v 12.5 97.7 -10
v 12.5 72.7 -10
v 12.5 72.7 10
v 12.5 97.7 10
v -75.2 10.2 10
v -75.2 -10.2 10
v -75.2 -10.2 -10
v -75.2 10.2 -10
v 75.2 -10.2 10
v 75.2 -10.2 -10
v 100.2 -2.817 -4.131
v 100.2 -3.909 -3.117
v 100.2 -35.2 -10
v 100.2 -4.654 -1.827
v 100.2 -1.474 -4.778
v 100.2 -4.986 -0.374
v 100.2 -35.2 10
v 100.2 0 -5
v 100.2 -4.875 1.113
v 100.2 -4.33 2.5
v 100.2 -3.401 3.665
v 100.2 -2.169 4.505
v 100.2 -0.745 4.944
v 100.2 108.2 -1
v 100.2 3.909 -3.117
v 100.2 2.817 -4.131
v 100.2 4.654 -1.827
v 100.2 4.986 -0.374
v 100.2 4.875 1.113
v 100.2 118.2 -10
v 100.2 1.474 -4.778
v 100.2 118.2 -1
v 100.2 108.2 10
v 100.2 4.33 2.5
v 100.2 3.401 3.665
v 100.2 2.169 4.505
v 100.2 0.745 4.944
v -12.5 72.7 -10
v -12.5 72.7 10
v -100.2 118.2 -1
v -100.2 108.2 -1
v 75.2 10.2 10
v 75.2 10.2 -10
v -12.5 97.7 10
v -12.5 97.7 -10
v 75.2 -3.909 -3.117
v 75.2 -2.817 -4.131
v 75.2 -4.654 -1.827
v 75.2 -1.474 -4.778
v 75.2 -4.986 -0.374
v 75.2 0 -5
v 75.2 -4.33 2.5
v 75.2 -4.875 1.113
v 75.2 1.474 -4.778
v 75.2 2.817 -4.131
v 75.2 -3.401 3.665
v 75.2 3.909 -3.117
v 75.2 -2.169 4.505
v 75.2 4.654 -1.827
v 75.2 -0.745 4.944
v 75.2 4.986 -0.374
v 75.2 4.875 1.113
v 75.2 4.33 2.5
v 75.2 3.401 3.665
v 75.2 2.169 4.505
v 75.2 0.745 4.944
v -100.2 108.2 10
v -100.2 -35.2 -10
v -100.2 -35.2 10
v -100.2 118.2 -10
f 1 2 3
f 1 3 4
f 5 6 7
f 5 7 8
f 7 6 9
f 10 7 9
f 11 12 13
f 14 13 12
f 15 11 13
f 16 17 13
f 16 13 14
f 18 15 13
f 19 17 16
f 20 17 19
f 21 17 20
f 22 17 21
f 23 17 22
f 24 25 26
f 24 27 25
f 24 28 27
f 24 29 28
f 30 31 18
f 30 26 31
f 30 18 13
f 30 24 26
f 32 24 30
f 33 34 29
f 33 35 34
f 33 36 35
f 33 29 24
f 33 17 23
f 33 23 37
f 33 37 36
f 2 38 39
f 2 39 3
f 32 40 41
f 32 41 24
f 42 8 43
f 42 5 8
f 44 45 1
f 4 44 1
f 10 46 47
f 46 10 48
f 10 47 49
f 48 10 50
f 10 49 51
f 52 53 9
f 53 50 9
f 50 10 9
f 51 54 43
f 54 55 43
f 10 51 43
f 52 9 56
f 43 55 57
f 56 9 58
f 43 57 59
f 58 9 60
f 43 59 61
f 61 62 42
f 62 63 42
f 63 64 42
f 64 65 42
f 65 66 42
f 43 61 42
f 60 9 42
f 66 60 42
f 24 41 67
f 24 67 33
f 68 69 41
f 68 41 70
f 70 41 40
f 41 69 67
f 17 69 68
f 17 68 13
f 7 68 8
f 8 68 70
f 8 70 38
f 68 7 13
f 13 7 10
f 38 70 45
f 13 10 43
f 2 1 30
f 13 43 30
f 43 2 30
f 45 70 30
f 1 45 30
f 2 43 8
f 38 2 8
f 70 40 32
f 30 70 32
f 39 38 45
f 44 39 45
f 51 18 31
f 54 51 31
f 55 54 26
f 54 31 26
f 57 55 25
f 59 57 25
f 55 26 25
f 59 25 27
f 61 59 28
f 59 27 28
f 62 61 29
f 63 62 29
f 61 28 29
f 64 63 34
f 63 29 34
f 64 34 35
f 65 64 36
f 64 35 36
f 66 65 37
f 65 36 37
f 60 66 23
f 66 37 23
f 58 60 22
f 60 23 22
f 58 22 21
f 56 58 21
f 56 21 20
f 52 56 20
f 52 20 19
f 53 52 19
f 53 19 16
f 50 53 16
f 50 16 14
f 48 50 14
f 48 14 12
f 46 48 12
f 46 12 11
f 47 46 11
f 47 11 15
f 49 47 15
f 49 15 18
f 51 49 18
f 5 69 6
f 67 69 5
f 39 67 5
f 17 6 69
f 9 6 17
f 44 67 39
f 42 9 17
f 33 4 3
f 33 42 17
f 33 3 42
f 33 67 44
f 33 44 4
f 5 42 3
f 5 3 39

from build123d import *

# Parameters (mm, degrees)
SKETCH2_W               = 200.4
SKETCH2_H               = 153.4
SKETCH2_W_2             = 150.4
SKETCH2_H_2             = 20.4
BOSS_EXTRUDE1_DEPTH     = 10
CUT_EXTRUDE1_REACH      = 234.876
SKETCH4_R               = 5
CUT_EXTRUDE2_DEPTH      = 157.241095746
CUT_EXTRUDE2_DEPTH_BACK = 157.241095746
SKETCH7_W               = 25
SKETCH7_H               = 25
SKETCH8_W               = 200.4
SKETCH8_H               = 11
CUT_EXTRUDE3_DEPTH      = 10


with BuildPart() as part:
    # Sketch2 → Boss-Extrude1 (new, symmetric)
    with BuildSketch(Plane.XY):
        with Locations((0, 41.5)):
            Rectangle(SKETCH2_W, SKETCH2_H)
        Rectangle(SKETCH2_W_2, SKETCH2_H_2, mode=Mode.SUBTRACT)
    extrude(amount=BOSS_EXTRUDE1_DEPTH, both=True)

    # Sketch4 → Cut-Extrude1 (cut, up to next)
    with BuildSketch(Plane(origin=(100.2, 0, 0), x_dir=(0, 0, -1), z_dir=(1, 0, 0)), mode=Mode.PRIVATE) as cut_extrude1_sk1:
        Circle(SKETCH4_R)
    cut_extrude1_tool1 = extrude(cut_extrude1_sk1.sketch, amount=-CUT_EXTRUDE1_REACH, mode=Mode.PRIVATE) & part.part
    add(cut_extrude1_tool1.solids().sort_by_distance((100.2, 0, 0))[0], mode=Mode.SUBTRACT)

    # Sketch7 → Cut-Extrude2 (cut, two sides: drawn at the far end of the back side and taken through both)
    with BuildSketch(Plane.XY.offset(10).offset(-CUT_EXTRUDE2_DEPTH_BACK)):
        with Locations((0, 85.2)):
            Rectangle(SKETCH7_W, SKETCH7_H)
    extrude(amount=CUT_EXTRUDE2_DEPTH + CUT_EXTRUDE2_DEPTH_BACK, mode=Mode.SUBTRACT)

    # Sketch8 → Cut-Extrude3 (cut)
    with BuildSketch(Plane(origin=(0, 118.2, 0), x_dir=(1, 0, 0), z_dir=(0, 1, 0))):
        with Locations((0, -4.5)):
            Rectangle(SKETCH8_W, SKETCH8_H)
    extrude(amount=-CUT_EXTRUDE3_DEPTH, mode=Mode.SUBTRACT)


solid = part.part
